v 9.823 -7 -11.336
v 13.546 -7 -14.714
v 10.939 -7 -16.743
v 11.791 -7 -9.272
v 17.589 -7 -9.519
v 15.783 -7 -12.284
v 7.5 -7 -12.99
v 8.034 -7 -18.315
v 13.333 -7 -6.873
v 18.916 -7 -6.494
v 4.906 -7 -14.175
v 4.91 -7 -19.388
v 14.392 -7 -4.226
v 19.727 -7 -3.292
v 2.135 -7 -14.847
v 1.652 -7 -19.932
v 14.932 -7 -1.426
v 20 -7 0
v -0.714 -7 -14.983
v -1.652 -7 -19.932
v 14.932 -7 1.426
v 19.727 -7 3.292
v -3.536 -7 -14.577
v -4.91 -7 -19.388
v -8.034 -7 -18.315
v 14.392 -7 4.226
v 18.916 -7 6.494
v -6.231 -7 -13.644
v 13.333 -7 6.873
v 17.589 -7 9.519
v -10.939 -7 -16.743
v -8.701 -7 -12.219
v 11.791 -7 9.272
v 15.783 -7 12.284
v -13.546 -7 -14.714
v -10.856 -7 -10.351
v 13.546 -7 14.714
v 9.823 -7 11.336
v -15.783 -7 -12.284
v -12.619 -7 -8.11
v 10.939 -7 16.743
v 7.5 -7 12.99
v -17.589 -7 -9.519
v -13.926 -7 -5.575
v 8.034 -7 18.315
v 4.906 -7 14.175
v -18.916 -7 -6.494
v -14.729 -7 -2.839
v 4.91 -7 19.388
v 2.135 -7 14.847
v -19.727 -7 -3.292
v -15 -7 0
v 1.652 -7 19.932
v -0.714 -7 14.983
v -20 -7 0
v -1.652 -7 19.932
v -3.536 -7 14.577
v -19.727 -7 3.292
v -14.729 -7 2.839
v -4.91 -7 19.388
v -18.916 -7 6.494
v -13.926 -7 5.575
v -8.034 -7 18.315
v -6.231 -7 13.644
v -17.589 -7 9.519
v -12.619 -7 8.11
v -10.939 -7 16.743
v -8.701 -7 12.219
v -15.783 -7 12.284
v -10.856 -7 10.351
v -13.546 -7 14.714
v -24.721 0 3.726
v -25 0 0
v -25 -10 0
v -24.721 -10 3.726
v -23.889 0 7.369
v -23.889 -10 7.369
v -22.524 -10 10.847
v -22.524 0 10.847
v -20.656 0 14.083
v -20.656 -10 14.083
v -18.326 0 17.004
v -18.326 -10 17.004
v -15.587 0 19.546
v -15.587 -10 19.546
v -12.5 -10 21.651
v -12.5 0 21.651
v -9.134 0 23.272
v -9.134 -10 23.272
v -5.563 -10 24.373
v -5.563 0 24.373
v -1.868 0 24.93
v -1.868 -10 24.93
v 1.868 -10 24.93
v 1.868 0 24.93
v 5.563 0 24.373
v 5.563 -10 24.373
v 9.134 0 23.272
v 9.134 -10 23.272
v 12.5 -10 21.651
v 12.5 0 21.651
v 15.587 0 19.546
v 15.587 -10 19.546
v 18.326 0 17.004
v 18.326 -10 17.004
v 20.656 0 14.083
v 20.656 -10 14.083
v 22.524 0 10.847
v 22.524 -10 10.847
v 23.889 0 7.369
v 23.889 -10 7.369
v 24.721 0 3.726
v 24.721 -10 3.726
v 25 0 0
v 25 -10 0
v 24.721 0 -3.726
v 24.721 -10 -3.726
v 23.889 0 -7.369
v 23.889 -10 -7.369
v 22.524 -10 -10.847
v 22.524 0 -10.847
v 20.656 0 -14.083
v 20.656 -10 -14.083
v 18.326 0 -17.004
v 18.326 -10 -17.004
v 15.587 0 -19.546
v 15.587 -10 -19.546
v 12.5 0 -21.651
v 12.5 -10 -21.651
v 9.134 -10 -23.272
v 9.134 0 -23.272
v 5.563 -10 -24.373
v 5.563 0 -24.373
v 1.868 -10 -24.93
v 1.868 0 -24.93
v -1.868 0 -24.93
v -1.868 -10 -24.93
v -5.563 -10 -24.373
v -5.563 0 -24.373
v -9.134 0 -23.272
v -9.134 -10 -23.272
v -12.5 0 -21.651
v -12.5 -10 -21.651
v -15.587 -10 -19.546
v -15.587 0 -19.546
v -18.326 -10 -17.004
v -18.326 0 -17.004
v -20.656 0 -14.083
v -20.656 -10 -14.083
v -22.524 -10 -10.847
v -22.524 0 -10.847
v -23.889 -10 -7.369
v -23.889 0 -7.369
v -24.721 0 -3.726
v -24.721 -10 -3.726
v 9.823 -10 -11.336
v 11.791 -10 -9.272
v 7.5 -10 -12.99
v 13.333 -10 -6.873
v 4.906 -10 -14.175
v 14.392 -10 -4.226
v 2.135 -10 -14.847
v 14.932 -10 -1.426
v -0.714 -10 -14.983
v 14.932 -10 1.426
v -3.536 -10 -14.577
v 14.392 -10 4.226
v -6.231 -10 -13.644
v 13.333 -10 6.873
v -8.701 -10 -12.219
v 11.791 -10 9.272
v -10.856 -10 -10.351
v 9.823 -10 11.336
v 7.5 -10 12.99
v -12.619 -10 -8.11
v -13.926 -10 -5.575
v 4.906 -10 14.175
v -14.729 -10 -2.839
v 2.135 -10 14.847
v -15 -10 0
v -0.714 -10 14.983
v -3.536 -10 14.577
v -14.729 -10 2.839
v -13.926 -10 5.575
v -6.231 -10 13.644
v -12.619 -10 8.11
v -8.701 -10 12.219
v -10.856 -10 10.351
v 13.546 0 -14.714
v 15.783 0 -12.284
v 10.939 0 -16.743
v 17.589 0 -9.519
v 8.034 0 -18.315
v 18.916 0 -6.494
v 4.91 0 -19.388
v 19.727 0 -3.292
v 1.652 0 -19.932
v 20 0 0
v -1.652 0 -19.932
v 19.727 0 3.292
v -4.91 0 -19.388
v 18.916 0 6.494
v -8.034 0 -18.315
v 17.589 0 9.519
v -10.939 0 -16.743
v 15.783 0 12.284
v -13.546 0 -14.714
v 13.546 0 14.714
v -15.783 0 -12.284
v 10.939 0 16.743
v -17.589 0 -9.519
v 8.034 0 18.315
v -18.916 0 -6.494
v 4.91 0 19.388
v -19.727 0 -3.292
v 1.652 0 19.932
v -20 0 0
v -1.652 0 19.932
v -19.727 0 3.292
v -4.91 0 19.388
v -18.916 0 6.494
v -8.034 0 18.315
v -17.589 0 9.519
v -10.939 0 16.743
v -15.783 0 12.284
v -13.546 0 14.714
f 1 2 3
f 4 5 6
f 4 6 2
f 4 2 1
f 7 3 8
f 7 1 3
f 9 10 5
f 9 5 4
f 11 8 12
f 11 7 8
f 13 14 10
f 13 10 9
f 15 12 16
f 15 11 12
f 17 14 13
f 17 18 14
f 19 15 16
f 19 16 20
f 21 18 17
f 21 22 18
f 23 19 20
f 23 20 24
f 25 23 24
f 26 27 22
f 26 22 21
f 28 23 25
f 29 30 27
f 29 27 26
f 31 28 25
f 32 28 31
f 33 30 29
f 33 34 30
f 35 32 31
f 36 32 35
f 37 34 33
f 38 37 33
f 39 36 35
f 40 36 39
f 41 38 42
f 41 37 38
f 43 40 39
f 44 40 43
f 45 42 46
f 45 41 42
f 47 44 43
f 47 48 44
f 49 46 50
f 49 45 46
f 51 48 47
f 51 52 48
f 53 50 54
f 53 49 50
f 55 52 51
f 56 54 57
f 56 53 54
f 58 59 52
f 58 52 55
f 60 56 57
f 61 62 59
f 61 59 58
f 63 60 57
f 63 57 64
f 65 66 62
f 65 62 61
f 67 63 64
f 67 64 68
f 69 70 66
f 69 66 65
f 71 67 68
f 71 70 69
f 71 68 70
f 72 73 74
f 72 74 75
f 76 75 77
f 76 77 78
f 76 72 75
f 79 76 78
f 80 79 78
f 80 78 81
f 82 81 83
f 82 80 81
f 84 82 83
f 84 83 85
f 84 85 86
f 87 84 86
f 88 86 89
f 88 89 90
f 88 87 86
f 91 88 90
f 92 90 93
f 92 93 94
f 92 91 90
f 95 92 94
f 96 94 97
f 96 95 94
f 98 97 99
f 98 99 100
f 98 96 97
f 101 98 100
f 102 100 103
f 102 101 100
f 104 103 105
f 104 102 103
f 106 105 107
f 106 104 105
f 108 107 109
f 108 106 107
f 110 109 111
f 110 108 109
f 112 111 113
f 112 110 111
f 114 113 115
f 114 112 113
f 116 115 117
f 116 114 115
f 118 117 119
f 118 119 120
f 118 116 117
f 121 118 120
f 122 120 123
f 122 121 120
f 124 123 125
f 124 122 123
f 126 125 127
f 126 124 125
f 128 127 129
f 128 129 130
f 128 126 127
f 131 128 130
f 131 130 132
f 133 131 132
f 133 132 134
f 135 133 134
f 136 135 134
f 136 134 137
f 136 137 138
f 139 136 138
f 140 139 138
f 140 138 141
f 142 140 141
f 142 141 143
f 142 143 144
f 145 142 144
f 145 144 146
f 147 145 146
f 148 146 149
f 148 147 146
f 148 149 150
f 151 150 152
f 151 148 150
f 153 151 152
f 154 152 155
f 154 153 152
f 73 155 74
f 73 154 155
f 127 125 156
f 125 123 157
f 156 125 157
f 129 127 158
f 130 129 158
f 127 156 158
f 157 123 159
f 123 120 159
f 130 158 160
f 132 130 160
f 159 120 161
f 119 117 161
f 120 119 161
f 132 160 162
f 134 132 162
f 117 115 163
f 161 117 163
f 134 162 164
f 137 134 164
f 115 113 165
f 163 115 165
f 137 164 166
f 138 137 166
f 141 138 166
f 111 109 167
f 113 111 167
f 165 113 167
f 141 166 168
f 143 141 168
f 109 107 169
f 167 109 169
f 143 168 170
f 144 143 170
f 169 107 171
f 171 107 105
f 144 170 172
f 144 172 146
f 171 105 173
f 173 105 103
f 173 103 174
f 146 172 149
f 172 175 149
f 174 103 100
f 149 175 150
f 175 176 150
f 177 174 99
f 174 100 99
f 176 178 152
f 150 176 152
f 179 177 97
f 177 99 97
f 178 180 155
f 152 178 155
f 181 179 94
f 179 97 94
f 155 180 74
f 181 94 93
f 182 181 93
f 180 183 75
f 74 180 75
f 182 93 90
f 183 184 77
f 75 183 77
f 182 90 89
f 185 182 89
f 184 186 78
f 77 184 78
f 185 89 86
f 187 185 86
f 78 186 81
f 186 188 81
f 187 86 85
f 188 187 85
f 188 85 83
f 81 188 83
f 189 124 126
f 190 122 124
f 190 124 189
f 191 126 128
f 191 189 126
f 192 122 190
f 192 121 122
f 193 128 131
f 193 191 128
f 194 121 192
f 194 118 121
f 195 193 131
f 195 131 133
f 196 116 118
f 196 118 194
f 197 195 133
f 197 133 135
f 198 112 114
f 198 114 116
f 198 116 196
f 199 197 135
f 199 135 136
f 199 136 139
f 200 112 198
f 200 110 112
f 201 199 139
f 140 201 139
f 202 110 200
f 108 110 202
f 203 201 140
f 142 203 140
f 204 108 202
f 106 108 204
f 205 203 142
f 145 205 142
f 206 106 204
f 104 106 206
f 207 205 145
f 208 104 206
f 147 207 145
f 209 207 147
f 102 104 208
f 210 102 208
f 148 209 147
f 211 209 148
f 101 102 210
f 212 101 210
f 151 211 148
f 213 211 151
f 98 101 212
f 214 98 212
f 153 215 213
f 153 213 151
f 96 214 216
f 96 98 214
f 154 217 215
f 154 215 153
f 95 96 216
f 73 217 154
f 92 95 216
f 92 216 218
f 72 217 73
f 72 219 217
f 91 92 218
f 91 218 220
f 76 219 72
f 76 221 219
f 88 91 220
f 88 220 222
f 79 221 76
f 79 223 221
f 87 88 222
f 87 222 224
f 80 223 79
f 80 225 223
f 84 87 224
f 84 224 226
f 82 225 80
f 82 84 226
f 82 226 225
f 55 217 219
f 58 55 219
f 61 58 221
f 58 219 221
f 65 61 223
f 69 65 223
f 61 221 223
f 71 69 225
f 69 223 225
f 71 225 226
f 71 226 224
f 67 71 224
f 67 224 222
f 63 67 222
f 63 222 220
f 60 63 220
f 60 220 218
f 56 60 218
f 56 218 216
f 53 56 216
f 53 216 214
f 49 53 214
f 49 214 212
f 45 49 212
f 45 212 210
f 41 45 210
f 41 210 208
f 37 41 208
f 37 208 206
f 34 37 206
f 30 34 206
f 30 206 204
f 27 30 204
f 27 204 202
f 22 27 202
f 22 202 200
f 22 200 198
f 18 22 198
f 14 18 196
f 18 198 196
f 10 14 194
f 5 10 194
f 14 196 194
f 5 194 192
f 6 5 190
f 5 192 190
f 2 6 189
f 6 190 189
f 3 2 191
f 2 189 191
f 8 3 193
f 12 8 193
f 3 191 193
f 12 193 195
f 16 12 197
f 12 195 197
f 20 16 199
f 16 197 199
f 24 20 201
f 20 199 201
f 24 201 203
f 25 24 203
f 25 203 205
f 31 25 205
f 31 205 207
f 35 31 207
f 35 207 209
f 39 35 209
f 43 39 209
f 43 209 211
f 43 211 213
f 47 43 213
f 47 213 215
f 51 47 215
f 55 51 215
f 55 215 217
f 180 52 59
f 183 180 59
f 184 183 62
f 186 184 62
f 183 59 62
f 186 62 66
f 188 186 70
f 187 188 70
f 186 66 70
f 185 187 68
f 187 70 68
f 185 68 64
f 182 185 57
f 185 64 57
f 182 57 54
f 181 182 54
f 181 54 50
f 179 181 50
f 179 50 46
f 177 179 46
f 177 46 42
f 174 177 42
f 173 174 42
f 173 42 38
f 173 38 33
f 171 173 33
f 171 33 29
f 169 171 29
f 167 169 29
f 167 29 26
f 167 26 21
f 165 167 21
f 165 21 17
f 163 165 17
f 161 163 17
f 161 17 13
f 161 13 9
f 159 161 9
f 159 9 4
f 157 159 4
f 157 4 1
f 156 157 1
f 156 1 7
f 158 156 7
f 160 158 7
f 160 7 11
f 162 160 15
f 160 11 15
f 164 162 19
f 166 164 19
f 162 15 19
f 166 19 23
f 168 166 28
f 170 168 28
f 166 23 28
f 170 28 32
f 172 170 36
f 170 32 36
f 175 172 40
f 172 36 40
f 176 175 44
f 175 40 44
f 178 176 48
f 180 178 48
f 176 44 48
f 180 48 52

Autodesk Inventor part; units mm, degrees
ref_plane "YZ Plane" through (0, 0, 0) normal (1, 0, 0) x (0, 1, 0)
ref_plane "XZ Plane" through (0, 0, 0) normal (0, 1, 0) x (-1, 0, 0)
ref_plane "XY Plane" through (0, 0, 0) normal (0, 0, 1) x (1, 0, 0)
sketch "Sketch1" plane through (0, 0, 0) normal (0, 1, 0) x (-1, 0, 0)
  circle A0 centre (0, 0) radius 25
  dimension "d0" = 50
extrude "Extrusion1" add sketch "Sketch1" against normal blind 10
sketch "Sketch3" plane through (0, 0, 0) normal (0, 1, 0) x (-1, 0, 0)
  circle A0 centre (0, 0) radius 15
  dimension "d3" = 30
extrude "Extrusion2" cut sketch "Sketch3" against normal blind 10
sketch "Sketch4" plane through (0, 0, 0) normal (0, 1, 0) x (-1, 0, 0)
  circle A0 centre (0, 0) radius 20
  dimension "d6" = 40
extrude "Extrusion3" cut sketch "Sketch4" against normal blind 7
properties part number "Седло для сальника"
